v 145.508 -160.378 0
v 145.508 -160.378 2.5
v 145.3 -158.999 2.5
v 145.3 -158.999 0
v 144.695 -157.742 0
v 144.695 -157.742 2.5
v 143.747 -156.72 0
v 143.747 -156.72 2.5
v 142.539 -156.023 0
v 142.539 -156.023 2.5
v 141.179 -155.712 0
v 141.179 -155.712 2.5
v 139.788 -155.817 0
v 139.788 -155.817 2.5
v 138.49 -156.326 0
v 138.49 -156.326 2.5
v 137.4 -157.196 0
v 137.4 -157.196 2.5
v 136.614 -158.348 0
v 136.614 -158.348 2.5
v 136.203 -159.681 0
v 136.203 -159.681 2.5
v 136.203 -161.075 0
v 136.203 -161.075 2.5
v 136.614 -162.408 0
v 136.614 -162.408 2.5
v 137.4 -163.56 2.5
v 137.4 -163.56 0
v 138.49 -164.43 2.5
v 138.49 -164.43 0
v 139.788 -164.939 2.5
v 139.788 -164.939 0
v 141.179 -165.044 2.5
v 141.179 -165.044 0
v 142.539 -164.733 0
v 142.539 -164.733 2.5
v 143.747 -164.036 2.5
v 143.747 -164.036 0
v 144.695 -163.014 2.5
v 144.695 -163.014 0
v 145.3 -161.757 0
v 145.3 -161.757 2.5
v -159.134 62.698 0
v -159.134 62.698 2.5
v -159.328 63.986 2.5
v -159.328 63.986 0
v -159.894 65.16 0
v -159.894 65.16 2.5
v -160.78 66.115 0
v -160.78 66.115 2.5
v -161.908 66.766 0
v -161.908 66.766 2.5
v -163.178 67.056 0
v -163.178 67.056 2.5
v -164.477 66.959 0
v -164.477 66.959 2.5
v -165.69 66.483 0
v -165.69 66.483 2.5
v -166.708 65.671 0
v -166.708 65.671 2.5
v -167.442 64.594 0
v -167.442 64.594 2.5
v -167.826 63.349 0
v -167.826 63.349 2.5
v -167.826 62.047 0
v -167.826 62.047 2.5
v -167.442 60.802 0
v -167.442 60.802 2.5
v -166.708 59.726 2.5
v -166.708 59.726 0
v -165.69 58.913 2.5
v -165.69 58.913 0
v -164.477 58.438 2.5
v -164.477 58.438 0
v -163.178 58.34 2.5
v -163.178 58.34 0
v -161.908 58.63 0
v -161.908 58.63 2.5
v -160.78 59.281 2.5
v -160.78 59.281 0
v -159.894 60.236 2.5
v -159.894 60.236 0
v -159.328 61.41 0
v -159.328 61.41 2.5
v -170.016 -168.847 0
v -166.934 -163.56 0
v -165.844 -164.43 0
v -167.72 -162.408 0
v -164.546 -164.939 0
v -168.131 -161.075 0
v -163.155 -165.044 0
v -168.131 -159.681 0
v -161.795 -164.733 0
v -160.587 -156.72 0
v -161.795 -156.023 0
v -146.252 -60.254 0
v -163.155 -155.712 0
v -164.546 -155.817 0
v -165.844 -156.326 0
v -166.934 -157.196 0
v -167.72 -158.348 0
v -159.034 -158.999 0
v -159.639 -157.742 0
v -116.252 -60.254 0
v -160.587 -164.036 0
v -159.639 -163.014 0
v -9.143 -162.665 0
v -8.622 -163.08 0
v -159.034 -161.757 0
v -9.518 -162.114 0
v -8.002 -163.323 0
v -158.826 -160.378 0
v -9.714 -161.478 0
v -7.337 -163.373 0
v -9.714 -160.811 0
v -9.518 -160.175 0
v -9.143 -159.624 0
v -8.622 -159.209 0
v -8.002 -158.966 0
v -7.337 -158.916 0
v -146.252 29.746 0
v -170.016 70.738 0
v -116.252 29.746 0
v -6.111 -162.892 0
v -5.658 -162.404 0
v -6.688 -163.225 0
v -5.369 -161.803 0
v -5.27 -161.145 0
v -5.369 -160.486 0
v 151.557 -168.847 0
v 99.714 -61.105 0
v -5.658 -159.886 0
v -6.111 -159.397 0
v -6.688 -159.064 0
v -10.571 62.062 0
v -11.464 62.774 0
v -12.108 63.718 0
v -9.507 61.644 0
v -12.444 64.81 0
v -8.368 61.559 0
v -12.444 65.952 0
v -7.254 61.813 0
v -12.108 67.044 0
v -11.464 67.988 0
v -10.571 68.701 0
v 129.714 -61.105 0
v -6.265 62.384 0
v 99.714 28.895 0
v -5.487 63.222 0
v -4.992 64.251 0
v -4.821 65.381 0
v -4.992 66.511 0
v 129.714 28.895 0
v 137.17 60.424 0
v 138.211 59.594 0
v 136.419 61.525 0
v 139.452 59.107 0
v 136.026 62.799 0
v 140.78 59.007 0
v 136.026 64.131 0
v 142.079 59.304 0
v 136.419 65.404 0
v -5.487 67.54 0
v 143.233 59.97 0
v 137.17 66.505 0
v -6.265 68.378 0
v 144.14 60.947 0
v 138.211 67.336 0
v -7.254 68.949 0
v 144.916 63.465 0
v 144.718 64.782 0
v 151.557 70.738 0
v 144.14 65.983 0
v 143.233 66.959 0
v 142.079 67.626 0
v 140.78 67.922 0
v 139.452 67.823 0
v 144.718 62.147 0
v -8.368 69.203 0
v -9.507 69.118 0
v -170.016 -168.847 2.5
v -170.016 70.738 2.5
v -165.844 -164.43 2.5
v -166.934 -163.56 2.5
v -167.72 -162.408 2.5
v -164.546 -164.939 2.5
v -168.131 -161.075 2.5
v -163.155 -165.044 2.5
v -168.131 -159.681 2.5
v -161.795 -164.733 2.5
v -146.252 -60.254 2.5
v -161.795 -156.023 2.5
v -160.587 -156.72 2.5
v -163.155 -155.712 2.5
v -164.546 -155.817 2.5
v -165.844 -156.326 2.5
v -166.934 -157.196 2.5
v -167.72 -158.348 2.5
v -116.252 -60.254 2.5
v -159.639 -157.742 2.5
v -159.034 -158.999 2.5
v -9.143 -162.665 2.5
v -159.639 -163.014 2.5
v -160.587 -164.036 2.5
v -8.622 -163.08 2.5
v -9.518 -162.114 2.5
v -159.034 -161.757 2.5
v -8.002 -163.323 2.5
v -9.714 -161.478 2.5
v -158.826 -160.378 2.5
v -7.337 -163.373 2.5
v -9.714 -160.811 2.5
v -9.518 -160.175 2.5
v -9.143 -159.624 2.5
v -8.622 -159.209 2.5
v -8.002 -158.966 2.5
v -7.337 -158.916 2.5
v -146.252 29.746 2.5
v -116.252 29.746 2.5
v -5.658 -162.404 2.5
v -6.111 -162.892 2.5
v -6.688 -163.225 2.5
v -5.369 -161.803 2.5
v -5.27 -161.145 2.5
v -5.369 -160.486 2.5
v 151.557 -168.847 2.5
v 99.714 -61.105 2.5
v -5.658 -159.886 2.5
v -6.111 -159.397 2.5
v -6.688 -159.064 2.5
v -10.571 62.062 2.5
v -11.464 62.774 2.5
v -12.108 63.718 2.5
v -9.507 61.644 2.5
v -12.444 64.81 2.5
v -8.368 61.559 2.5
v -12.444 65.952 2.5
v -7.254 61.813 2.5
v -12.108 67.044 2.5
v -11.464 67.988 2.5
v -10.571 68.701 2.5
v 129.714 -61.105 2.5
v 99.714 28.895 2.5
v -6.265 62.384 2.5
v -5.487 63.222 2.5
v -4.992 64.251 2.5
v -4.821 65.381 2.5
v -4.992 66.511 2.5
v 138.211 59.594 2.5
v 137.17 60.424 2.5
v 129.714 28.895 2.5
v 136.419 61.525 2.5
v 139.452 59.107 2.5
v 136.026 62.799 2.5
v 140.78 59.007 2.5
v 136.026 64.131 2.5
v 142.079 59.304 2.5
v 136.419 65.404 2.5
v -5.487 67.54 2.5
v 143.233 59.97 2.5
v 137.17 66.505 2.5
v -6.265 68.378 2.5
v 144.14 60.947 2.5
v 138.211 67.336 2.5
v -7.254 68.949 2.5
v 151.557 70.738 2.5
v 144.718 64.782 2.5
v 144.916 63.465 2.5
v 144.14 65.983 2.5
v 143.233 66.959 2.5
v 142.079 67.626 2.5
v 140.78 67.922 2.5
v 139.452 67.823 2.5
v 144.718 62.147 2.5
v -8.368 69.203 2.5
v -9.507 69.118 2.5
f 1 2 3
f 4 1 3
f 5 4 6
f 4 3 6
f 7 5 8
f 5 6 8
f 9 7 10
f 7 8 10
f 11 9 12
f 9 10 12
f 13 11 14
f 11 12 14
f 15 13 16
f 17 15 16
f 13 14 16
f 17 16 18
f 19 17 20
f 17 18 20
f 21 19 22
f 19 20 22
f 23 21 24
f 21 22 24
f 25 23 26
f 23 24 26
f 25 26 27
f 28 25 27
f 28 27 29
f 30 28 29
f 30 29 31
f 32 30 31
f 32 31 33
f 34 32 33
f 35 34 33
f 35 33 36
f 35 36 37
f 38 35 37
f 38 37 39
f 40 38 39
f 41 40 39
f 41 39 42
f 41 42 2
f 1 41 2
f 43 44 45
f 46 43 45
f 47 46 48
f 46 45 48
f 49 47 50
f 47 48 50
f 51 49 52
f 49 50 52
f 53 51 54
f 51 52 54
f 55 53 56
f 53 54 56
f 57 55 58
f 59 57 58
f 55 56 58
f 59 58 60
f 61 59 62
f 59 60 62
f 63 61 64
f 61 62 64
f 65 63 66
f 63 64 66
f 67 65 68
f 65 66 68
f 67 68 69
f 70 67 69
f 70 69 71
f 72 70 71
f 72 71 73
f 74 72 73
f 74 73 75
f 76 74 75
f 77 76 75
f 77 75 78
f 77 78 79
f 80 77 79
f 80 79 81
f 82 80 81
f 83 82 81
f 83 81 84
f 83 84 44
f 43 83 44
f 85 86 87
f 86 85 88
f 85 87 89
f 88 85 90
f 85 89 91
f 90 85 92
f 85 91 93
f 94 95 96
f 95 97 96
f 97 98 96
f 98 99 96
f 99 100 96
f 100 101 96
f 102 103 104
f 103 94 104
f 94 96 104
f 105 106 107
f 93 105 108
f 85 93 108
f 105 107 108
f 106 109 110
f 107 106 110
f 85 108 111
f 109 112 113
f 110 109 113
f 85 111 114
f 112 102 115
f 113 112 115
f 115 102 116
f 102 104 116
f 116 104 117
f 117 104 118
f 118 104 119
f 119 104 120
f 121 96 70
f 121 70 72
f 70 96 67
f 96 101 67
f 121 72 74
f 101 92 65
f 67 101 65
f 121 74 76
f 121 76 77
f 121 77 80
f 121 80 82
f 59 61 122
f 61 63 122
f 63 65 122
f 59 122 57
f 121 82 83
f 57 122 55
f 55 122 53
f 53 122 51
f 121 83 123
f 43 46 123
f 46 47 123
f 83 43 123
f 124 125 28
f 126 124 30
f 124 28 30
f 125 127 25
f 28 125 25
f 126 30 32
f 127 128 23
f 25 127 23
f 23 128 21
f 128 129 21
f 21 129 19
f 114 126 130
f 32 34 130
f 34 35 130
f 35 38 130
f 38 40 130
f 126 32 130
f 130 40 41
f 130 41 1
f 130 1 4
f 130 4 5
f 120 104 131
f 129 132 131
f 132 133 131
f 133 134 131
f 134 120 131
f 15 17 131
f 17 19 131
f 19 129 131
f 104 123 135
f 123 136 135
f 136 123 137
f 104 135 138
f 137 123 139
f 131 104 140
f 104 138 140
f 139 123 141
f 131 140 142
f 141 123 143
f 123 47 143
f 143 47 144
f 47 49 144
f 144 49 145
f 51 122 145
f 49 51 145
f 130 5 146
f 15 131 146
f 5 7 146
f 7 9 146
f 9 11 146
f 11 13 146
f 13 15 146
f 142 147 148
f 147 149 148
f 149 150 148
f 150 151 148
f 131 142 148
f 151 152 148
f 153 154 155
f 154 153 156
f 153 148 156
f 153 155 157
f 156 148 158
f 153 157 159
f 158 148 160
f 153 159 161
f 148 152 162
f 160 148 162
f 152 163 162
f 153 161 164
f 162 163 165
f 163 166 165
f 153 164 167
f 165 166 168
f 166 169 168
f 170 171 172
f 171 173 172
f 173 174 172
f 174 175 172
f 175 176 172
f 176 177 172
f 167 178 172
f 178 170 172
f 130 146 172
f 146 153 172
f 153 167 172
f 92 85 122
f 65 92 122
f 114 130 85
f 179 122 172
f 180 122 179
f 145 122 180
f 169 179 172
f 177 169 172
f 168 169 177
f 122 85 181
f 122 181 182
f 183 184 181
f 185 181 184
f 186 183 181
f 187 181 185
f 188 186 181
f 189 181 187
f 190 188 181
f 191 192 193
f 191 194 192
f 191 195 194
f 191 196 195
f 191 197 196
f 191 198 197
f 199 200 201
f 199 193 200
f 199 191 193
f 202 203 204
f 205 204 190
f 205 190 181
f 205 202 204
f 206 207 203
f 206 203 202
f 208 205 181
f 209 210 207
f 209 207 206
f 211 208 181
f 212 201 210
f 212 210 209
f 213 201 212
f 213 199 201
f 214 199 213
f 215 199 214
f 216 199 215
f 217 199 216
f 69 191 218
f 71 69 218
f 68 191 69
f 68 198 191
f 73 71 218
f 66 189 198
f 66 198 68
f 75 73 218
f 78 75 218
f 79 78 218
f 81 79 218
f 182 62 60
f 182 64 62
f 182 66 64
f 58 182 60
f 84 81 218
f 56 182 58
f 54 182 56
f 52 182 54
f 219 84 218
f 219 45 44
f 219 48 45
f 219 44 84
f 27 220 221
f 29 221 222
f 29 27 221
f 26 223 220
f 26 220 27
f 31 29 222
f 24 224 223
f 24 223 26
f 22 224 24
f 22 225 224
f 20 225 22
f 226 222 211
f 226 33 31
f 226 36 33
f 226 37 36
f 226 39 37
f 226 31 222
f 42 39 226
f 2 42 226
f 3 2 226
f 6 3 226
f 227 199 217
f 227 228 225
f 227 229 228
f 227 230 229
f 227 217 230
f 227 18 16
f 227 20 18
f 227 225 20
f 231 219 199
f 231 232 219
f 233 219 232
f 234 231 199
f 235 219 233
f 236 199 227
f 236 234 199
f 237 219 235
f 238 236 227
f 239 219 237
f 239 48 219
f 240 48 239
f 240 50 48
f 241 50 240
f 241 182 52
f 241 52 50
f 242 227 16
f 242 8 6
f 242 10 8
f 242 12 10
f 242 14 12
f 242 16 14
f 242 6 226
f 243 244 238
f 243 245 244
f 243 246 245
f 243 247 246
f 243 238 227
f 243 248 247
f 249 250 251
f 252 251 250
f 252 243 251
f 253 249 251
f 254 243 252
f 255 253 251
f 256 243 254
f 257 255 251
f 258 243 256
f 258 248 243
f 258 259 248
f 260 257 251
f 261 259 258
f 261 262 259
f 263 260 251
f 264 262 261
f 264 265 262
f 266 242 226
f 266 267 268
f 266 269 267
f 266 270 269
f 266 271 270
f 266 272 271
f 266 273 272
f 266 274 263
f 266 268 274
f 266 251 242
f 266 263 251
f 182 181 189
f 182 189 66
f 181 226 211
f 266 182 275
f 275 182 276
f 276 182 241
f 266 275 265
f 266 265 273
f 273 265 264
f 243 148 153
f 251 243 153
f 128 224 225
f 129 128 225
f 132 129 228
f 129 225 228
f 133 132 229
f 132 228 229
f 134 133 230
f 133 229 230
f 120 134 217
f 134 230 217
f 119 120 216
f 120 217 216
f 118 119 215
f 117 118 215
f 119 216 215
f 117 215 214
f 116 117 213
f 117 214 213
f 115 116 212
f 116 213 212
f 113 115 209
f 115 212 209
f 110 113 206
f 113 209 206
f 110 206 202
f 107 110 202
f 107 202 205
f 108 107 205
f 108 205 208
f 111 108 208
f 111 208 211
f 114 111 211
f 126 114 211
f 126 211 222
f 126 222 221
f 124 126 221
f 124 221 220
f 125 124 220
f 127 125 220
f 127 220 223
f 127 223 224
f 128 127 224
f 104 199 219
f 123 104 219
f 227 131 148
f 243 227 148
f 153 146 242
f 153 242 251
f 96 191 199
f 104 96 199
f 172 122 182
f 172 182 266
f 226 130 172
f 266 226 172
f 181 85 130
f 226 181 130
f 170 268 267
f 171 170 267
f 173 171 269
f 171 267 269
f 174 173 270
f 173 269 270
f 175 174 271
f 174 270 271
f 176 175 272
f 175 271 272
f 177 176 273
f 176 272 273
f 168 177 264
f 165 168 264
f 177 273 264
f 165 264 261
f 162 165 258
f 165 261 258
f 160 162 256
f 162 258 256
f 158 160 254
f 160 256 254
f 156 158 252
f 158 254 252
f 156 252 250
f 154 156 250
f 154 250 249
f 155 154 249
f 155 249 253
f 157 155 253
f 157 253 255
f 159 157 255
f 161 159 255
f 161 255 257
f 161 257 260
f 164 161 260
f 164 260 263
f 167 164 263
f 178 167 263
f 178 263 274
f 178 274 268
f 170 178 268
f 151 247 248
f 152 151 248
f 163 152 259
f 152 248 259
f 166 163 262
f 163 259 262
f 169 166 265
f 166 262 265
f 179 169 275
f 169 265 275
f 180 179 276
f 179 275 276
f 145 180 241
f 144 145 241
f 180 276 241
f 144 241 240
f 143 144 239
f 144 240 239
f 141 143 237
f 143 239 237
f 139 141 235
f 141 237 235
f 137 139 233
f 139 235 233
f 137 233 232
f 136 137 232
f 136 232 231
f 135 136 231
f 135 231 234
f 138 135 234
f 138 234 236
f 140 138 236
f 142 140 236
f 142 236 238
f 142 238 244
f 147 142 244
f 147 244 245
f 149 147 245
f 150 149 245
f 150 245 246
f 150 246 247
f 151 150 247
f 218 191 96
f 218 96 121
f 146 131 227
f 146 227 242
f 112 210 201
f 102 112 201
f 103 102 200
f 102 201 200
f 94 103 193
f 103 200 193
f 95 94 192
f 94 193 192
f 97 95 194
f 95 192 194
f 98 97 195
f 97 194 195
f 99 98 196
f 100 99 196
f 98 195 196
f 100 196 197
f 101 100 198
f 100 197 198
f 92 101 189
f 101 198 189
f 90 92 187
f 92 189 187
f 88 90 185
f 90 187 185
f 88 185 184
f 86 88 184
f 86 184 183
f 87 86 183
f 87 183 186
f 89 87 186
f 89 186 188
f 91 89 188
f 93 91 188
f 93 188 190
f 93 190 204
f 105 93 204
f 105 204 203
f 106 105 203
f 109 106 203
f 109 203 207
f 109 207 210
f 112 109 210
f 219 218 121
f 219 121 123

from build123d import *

# Parameters (mm, degrees)
F0_W     = 321.573243
F0_H     = 239.584401
F1_DEPTH = 2.5
F2_W     = 30
F2_H     = 90
F3_DEPTH = 30
F4_W     = 30
F4_H     = 90
F5_DEPTH = 30
F6_R     = 4.370205
F6_R_2   = 4.469907
F6_R_3   = 3.832918
F6_R_4   = 2.234953
F6_R_5   = 4.678676
F6_R_6   = 4.678688
F7_DEPTH = 30


with BuildPart() as f1:
    # F0 (on Top) → F1 (new body)
    with BuildSketch(Plane.XY):
        with Locations((-9.229324, -49.054674)):
            Rectangle(F0_W, F0_H)
    extrude(amount=F1_DEPTH)

    # F2 (on face) → F3 (cut)
    with BuildSketch(Plane.XY.offset(2.5)):
        with Locations((-131.251947, -15.25378)):
            Rectangle(F2_W, F2_H)
    extrude(amount=-F3_DEPTH, mode=Mode.SUBTRACT)

    # F4 (on Top) → F5 (cut)
    with BuildSketch(Plane.XY):
        with Locations((114.714116, -16.105251)):
            Rectangle(F4_W, F4_H)
    extrude(amount=F5_DEPTH, mode=Mode.SUBTRACT)

    # F6 (on face) → F7 (cut)
    with BuildSketch(Plane.XY.offset(2.5)):
        with Locations((-163.504452, 62.698148)):
            Circle(F6_R)
        with Locations((140.44629, 63.464731)):
            Circle(F6_R_2)
        with Locations((-8.654387, 65.381192)):
            Circle(F6_R_3)
        with Locations((-7.504508, -161.144525)):
            Circle(F6_R_4)
        with Locations((-163.504452, -160.377949)):
            Circle(F6_R_5)
        with Locations((140.829593, -160.377949)):
            Circle(F6_R_6)
    extrude(amount=-F7_DEPTH, mode=Mode.SUBTRACT)


solid = f1.part
